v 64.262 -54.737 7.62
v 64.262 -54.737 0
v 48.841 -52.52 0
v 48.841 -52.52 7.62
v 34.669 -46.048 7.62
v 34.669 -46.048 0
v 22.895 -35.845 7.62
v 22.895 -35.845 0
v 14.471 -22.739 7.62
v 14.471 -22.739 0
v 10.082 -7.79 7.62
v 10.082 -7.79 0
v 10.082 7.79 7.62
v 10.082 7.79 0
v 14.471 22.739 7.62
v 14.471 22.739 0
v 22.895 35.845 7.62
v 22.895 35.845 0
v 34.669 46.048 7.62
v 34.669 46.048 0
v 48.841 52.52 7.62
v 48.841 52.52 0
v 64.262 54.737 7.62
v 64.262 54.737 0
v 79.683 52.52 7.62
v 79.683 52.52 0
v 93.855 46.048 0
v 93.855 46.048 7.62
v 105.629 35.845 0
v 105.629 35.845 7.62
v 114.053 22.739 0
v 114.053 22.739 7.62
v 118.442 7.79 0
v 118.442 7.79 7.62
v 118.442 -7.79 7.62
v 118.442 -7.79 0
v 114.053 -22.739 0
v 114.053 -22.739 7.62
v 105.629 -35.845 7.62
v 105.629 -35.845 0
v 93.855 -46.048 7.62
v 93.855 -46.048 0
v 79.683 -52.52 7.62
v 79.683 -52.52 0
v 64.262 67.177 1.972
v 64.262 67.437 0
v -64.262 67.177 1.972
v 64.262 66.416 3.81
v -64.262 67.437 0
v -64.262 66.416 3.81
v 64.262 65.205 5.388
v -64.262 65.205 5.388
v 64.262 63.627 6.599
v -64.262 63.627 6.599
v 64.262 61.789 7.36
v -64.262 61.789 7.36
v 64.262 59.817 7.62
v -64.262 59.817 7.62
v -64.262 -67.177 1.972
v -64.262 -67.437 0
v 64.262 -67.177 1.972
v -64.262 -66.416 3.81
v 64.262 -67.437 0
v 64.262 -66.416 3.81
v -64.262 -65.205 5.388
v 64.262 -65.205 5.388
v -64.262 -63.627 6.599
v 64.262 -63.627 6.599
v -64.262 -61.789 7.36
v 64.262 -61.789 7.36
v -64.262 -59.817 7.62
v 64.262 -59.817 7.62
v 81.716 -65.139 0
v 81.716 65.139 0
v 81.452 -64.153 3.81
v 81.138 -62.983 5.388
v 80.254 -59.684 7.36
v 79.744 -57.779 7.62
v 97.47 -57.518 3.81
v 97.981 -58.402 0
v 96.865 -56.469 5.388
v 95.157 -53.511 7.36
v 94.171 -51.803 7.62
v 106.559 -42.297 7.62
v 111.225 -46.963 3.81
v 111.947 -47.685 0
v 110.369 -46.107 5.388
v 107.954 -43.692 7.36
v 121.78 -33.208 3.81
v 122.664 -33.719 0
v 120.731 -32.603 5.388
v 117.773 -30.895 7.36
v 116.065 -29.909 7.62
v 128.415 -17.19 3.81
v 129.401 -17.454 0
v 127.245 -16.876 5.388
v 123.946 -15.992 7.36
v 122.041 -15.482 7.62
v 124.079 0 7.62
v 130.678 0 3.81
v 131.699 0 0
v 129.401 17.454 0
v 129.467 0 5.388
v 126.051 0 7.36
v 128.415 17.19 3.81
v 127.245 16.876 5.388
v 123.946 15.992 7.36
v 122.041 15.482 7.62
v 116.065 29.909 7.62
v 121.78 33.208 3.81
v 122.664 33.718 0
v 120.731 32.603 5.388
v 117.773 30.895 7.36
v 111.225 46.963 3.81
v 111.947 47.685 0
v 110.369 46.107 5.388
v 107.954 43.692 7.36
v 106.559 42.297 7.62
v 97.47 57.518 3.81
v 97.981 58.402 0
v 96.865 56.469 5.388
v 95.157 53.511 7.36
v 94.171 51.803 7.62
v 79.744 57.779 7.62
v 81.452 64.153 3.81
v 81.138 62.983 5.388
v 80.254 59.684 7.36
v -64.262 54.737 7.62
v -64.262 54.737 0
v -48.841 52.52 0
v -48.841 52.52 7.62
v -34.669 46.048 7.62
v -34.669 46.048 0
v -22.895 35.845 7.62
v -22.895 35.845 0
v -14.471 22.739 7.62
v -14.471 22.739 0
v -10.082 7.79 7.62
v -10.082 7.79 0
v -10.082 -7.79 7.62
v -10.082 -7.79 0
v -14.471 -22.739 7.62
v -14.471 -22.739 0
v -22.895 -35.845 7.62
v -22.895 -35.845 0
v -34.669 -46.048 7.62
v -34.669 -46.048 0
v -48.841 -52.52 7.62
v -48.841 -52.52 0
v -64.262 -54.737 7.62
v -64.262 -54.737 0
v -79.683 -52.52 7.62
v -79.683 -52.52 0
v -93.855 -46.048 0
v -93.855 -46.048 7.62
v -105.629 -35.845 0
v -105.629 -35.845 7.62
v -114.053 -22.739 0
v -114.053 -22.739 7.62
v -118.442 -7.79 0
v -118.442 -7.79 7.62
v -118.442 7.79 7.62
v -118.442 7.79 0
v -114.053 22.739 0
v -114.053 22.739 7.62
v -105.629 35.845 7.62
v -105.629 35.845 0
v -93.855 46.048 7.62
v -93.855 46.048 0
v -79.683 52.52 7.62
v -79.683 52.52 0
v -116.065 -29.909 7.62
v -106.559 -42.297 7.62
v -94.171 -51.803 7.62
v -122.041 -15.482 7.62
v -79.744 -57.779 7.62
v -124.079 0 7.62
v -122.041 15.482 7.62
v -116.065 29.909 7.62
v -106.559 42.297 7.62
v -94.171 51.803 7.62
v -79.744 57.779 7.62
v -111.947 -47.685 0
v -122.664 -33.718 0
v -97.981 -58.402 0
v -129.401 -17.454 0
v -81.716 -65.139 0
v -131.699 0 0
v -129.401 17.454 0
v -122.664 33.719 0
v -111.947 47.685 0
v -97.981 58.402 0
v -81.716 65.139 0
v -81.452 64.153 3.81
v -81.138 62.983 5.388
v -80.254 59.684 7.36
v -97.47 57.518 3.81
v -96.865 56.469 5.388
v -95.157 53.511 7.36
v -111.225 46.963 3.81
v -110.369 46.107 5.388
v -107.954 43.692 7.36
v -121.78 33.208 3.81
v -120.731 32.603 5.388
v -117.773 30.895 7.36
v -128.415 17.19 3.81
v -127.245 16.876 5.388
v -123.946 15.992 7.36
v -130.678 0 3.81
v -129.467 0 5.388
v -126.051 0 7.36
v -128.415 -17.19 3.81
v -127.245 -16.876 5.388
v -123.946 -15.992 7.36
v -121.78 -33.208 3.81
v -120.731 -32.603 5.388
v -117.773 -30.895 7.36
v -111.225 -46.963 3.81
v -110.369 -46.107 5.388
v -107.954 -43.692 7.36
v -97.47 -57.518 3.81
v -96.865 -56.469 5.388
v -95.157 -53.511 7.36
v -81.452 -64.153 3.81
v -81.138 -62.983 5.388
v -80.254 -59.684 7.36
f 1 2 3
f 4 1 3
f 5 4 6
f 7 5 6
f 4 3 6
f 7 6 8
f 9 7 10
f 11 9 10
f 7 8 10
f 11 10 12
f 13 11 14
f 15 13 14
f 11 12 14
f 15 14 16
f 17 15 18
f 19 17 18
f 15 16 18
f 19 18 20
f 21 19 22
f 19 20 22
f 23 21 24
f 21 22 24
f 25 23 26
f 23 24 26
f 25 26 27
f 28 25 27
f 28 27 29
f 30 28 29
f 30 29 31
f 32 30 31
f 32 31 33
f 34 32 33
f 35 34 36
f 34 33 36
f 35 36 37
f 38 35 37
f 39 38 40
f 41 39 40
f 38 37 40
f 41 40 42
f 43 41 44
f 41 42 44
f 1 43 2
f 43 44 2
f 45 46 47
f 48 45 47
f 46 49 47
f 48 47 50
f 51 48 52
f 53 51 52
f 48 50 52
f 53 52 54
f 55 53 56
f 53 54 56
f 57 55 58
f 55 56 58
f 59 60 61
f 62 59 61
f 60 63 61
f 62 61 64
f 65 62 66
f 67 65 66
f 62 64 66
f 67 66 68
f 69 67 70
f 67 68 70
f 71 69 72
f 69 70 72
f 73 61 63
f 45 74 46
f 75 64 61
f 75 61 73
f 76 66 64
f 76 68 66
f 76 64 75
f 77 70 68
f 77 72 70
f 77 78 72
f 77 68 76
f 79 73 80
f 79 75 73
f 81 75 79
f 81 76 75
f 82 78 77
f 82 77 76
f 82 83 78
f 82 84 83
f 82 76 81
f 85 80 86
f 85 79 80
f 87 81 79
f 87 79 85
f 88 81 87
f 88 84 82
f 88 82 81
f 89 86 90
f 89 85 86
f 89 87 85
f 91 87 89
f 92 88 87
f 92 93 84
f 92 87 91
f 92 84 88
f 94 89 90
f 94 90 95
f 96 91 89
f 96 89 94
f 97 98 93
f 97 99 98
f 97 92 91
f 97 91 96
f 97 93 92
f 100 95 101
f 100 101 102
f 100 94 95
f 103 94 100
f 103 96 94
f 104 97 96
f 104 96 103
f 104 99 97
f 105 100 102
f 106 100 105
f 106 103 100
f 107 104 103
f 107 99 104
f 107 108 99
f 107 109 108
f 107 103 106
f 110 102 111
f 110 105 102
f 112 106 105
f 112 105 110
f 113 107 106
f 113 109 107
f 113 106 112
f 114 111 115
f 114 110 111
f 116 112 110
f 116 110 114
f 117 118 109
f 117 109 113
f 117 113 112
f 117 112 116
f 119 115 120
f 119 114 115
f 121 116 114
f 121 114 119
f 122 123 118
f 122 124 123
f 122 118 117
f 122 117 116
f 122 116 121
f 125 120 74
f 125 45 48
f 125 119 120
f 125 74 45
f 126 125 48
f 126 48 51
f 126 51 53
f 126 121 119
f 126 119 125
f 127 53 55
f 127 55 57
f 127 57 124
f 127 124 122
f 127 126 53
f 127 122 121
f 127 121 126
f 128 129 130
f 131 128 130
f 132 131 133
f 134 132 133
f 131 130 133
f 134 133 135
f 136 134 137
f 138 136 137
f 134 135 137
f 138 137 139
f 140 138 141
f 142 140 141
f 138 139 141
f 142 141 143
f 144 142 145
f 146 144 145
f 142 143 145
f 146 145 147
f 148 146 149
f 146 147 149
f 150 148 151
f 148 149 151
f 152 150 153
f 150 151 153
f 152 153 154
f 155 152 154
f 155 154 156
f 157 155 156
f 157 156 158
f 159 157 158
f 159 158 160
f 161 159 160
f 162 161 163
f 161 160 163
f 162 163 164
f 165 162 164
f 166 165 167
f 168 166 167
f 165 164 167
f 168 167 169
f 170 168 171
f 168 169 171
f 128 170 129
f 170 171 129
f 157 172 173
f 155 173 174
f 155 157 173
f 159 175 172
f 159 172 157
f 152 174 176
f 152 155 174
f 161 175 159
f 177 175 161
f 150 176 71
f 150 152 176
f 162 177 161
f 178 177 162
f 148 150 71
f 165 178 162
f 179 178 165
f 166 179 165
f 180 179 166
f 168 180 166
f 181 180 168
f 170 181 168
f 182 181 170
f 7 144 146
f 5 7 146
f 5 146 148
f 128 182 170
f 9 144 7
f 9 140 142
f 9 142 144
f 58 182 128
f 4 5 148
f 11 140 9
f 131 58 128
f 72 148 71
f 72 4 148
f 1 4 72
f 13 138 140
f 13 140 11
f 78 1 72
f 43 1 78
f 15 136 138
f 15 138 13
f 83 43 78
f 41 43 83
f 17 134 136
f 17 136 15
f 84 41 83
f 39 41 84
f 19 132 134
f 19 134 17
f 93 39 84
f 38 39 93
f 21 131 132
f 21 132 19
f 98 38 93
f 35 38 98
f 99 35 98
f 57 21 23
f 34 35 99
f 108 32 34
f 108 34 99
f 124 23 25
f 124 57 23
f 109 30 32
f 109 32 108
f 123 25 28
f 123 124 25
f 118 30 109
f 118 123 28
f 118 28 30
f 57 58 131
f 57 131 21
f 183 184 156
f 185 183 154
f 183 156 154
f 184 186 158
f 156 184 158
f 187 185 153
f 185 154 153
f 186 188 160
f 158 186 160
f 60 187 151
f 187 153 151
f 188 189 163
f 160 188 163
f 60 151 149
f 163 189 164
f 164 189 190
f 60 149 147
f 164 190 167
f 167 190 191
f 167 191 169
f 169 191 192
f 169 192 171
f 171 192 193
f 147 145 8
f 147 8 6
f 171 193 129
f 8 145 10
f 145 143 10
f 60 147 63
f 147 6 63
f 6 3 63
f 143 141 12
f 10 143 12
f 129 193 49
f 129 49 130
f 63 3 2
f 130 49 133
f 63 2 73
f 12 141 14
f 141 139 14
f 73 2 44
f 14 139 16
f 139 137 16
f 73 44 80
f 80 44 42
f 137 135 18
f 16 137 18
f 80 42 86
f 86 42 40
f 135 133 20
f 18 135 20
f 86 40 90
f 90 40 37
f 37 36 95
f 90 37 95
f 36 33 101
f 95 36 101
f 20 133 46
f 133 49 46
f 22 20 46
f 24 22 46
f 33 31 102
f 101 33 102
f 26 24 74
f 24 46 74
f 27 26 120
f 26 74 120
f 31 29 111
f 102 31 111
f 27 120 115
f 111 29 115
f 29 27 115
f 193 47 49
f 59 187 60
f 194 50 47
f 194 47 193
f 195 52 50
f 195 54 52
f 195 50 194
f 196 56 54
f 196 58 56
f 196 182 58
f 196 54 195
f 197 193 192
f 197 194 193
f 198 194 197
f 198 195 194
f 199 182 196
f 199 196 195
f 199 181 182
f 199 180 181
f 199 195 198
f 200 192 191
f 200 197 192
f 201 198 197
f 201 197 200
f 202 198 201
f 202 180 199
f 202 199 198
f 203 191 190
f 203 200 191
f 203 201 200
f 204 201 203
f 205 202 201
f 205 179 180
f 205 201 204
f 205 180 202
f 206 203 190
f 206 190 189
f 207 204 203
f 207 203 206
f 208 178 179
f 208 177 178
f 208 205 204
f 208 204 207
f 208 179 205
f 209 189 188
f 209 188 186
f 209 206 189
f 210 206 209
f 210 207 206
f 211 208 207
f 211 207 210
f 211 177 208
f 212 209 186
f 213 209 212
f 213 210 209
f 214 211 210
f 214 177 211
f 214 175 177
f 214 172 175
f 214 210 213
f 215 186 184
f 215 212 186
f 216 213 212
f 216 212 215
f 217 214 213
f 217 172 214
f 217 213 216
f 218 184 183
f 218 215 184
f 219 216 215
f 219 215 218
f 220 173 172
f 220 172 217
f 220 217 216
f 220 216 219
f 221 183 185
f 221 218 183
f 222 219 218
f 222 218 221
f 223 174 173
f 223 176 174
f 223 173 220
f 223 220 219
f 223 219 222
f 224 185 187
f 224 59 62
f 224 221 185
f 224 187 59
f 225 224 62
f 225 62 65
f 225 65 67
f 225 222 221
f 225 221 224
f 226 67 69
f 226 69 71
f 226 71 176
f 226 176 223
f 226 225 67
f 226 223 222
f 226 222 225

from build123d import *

# Parameters (mm, degrees)
F1_DEPTH = 7.62
F2_R     = 7.61999


# Not quite as in the source:
# - a fillet or chamfer is up to 0.001 mm smaller than in the source, because OpenCascade refuses the exact size


with BuildPart() as f1:
    # F0 (on Top) → F1 (new body)
    with BuildSketch(Plane.XY):
        with BuildLine():
            ThreePointArc((64.2620003332, -67.437), (131.6990003332, 0), (64.2620003332, 67.437))
            Line((64.2620003332, 67.437), (-64.2620003332, 67.437))
            ThreePointArc((-64.2620003332, 67.437), (-131.6990003332, 0), (-64.2620003332, -67.437))
            Line((-64.2620003332, -67.437), (64.2620003332, -67.437))
        make_face()
        with BuildLine():
            Line((-64.2620003332, 54.737), (64.2620003332, 54.737))
            ThreePointArc((64.2620003332, 54.737), (118.9990003332, 0), (64.2620003332, -54.737))
            Line((64.2620003332, -54.737), (-64.2620003332, -54.737))
            ThreePointArc((-64.2620003332, -54.737), (-118.9990003332, 0), (-64.2620003332, 54.737))
        make_face(mode=Mode.SUBTRACT)
        with BuildLine():
            ThreePointArc((64.2620003332, -54.737), (9.5250003332, 0), (64.2620003332, 54.737))
            Line((64.2620003332, 54.737), (-64.2620003332, 54.737))
            ThreePointArc((-64.2620003332, 54.737), (-9.5250003332, 0), (-64.2620003332, -54.737))
            Line((-64.2620003332, -54.737), (64.2620003332, -54.737))
        make_face()
    extrude(amount=F1_DEPTH)

    # F2 (radius 7.62 in the source; OpenCascade refuses exactly that, so slightly less here)
    f2_edges = [f1.edges().sort_by_distance(p)[0] for p in [
        (-131.699, 0, 7.62),
    ]]
    fillet(f2_edges, radius=F2_R)


solid = f1.part
